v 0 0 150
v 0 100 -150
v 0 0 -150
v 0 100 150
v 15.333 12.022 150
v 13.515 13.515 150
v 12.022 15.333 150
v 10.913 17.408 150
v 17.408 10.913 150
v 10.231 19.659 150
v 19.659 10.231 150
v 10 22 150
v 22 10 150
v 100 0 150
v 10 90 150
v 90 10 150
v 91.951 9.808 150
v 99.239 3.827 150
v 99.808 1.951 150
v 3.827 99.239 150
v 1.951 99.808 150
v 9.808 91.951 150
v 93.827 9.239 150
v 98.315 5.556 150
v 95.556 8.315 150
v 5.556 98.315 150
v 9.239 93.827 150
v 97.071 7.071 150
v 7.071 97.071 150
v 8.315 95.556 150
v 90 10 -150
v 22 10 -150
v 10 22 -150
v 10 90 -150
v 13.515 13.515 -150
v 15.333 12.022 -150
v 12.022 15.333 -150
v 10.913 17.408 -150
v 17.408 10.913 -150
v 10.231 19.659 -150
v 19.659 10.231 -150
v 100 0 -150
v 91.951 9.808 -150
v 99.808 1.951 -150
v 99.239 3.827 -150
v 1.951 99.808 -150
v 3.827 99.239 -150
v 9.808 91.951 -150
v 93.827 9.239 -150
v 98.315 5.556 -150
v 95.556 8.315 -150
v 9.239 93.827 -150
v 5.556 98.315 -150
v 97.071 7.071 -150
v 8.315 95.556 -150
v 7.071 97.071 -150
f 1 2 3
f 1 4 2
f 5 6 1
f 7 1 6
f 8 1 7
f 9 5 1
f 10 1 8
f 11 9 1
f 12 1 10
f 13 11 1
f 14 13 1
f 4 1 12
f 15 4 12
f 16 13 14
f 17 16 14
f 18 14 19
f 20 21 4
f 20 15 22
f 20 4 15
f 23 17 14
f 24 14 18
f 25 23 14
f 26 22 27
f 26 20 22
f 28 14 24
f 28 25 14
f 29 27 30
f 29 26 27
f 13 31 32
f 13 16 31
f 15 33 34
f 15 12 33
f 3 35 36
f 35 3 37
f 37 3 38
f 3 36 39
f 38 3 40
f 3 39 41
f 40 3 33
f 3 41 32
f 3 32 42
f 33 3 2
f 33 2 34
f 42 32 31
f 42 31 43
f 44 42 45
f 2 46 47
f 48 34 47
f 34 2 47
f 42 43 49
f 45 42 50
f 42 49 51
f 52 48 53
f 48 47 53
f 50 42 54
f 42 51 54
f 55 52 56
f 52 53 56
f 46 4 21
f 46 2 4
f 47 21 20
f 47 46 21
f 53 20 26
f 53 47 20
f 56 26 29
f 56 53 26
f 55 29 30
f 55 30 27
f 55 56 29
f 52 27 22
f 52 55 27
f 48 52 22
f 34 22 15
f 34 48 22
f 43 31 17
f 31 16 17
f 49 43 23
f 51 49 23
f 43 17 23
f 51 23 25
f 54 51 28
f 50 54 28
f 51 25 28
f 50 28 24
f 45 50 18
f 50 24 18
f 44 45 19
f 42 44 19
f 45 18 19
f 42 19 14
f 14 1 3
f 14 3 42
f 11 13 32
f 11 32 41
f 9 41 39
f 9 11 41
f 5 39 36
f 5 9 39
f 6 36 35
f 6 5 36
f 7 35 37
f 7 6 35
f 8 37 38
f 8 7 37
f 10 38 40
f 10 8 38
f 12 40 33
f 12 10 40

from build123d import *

# Parameters (mm, degrees)
BASESTEELANGLE_DEPTH = 150
TOEFILLET_R          = 10


with BuildPart() as part:
    # Sketch1 → BaseSteelAngle (new, symmetric)
    with BuildSketch(Plane.XY):
        with BuildLine():
            Line((0, 100), (0, 0))
            Line((0, 0), (100, 0))
            Line((100, 0), (100, 10))
            Line((100, 10), (22, 10))
            ThreePointArc((22, 10), (13.514718626, 13.514718626), (10, 22))
            Line((10, 22), (10, 100))
            Line((10, 100), (0, 100))
        make_face()
    extrude(amount=BASESTEELANGLE_DEPTH, both=True)

    # ToeFillet
    toefillet_edges = [part.edges().sort_by_distance(p)[0] for p in [
        (10, 100, 0),
        (100, 10, 0),
    ]]
    fillet(toefillet_edges, radius=TOEFILLET_R - 0.0001)  # a hair under: the kernel refuses the full size


solid = part.part
